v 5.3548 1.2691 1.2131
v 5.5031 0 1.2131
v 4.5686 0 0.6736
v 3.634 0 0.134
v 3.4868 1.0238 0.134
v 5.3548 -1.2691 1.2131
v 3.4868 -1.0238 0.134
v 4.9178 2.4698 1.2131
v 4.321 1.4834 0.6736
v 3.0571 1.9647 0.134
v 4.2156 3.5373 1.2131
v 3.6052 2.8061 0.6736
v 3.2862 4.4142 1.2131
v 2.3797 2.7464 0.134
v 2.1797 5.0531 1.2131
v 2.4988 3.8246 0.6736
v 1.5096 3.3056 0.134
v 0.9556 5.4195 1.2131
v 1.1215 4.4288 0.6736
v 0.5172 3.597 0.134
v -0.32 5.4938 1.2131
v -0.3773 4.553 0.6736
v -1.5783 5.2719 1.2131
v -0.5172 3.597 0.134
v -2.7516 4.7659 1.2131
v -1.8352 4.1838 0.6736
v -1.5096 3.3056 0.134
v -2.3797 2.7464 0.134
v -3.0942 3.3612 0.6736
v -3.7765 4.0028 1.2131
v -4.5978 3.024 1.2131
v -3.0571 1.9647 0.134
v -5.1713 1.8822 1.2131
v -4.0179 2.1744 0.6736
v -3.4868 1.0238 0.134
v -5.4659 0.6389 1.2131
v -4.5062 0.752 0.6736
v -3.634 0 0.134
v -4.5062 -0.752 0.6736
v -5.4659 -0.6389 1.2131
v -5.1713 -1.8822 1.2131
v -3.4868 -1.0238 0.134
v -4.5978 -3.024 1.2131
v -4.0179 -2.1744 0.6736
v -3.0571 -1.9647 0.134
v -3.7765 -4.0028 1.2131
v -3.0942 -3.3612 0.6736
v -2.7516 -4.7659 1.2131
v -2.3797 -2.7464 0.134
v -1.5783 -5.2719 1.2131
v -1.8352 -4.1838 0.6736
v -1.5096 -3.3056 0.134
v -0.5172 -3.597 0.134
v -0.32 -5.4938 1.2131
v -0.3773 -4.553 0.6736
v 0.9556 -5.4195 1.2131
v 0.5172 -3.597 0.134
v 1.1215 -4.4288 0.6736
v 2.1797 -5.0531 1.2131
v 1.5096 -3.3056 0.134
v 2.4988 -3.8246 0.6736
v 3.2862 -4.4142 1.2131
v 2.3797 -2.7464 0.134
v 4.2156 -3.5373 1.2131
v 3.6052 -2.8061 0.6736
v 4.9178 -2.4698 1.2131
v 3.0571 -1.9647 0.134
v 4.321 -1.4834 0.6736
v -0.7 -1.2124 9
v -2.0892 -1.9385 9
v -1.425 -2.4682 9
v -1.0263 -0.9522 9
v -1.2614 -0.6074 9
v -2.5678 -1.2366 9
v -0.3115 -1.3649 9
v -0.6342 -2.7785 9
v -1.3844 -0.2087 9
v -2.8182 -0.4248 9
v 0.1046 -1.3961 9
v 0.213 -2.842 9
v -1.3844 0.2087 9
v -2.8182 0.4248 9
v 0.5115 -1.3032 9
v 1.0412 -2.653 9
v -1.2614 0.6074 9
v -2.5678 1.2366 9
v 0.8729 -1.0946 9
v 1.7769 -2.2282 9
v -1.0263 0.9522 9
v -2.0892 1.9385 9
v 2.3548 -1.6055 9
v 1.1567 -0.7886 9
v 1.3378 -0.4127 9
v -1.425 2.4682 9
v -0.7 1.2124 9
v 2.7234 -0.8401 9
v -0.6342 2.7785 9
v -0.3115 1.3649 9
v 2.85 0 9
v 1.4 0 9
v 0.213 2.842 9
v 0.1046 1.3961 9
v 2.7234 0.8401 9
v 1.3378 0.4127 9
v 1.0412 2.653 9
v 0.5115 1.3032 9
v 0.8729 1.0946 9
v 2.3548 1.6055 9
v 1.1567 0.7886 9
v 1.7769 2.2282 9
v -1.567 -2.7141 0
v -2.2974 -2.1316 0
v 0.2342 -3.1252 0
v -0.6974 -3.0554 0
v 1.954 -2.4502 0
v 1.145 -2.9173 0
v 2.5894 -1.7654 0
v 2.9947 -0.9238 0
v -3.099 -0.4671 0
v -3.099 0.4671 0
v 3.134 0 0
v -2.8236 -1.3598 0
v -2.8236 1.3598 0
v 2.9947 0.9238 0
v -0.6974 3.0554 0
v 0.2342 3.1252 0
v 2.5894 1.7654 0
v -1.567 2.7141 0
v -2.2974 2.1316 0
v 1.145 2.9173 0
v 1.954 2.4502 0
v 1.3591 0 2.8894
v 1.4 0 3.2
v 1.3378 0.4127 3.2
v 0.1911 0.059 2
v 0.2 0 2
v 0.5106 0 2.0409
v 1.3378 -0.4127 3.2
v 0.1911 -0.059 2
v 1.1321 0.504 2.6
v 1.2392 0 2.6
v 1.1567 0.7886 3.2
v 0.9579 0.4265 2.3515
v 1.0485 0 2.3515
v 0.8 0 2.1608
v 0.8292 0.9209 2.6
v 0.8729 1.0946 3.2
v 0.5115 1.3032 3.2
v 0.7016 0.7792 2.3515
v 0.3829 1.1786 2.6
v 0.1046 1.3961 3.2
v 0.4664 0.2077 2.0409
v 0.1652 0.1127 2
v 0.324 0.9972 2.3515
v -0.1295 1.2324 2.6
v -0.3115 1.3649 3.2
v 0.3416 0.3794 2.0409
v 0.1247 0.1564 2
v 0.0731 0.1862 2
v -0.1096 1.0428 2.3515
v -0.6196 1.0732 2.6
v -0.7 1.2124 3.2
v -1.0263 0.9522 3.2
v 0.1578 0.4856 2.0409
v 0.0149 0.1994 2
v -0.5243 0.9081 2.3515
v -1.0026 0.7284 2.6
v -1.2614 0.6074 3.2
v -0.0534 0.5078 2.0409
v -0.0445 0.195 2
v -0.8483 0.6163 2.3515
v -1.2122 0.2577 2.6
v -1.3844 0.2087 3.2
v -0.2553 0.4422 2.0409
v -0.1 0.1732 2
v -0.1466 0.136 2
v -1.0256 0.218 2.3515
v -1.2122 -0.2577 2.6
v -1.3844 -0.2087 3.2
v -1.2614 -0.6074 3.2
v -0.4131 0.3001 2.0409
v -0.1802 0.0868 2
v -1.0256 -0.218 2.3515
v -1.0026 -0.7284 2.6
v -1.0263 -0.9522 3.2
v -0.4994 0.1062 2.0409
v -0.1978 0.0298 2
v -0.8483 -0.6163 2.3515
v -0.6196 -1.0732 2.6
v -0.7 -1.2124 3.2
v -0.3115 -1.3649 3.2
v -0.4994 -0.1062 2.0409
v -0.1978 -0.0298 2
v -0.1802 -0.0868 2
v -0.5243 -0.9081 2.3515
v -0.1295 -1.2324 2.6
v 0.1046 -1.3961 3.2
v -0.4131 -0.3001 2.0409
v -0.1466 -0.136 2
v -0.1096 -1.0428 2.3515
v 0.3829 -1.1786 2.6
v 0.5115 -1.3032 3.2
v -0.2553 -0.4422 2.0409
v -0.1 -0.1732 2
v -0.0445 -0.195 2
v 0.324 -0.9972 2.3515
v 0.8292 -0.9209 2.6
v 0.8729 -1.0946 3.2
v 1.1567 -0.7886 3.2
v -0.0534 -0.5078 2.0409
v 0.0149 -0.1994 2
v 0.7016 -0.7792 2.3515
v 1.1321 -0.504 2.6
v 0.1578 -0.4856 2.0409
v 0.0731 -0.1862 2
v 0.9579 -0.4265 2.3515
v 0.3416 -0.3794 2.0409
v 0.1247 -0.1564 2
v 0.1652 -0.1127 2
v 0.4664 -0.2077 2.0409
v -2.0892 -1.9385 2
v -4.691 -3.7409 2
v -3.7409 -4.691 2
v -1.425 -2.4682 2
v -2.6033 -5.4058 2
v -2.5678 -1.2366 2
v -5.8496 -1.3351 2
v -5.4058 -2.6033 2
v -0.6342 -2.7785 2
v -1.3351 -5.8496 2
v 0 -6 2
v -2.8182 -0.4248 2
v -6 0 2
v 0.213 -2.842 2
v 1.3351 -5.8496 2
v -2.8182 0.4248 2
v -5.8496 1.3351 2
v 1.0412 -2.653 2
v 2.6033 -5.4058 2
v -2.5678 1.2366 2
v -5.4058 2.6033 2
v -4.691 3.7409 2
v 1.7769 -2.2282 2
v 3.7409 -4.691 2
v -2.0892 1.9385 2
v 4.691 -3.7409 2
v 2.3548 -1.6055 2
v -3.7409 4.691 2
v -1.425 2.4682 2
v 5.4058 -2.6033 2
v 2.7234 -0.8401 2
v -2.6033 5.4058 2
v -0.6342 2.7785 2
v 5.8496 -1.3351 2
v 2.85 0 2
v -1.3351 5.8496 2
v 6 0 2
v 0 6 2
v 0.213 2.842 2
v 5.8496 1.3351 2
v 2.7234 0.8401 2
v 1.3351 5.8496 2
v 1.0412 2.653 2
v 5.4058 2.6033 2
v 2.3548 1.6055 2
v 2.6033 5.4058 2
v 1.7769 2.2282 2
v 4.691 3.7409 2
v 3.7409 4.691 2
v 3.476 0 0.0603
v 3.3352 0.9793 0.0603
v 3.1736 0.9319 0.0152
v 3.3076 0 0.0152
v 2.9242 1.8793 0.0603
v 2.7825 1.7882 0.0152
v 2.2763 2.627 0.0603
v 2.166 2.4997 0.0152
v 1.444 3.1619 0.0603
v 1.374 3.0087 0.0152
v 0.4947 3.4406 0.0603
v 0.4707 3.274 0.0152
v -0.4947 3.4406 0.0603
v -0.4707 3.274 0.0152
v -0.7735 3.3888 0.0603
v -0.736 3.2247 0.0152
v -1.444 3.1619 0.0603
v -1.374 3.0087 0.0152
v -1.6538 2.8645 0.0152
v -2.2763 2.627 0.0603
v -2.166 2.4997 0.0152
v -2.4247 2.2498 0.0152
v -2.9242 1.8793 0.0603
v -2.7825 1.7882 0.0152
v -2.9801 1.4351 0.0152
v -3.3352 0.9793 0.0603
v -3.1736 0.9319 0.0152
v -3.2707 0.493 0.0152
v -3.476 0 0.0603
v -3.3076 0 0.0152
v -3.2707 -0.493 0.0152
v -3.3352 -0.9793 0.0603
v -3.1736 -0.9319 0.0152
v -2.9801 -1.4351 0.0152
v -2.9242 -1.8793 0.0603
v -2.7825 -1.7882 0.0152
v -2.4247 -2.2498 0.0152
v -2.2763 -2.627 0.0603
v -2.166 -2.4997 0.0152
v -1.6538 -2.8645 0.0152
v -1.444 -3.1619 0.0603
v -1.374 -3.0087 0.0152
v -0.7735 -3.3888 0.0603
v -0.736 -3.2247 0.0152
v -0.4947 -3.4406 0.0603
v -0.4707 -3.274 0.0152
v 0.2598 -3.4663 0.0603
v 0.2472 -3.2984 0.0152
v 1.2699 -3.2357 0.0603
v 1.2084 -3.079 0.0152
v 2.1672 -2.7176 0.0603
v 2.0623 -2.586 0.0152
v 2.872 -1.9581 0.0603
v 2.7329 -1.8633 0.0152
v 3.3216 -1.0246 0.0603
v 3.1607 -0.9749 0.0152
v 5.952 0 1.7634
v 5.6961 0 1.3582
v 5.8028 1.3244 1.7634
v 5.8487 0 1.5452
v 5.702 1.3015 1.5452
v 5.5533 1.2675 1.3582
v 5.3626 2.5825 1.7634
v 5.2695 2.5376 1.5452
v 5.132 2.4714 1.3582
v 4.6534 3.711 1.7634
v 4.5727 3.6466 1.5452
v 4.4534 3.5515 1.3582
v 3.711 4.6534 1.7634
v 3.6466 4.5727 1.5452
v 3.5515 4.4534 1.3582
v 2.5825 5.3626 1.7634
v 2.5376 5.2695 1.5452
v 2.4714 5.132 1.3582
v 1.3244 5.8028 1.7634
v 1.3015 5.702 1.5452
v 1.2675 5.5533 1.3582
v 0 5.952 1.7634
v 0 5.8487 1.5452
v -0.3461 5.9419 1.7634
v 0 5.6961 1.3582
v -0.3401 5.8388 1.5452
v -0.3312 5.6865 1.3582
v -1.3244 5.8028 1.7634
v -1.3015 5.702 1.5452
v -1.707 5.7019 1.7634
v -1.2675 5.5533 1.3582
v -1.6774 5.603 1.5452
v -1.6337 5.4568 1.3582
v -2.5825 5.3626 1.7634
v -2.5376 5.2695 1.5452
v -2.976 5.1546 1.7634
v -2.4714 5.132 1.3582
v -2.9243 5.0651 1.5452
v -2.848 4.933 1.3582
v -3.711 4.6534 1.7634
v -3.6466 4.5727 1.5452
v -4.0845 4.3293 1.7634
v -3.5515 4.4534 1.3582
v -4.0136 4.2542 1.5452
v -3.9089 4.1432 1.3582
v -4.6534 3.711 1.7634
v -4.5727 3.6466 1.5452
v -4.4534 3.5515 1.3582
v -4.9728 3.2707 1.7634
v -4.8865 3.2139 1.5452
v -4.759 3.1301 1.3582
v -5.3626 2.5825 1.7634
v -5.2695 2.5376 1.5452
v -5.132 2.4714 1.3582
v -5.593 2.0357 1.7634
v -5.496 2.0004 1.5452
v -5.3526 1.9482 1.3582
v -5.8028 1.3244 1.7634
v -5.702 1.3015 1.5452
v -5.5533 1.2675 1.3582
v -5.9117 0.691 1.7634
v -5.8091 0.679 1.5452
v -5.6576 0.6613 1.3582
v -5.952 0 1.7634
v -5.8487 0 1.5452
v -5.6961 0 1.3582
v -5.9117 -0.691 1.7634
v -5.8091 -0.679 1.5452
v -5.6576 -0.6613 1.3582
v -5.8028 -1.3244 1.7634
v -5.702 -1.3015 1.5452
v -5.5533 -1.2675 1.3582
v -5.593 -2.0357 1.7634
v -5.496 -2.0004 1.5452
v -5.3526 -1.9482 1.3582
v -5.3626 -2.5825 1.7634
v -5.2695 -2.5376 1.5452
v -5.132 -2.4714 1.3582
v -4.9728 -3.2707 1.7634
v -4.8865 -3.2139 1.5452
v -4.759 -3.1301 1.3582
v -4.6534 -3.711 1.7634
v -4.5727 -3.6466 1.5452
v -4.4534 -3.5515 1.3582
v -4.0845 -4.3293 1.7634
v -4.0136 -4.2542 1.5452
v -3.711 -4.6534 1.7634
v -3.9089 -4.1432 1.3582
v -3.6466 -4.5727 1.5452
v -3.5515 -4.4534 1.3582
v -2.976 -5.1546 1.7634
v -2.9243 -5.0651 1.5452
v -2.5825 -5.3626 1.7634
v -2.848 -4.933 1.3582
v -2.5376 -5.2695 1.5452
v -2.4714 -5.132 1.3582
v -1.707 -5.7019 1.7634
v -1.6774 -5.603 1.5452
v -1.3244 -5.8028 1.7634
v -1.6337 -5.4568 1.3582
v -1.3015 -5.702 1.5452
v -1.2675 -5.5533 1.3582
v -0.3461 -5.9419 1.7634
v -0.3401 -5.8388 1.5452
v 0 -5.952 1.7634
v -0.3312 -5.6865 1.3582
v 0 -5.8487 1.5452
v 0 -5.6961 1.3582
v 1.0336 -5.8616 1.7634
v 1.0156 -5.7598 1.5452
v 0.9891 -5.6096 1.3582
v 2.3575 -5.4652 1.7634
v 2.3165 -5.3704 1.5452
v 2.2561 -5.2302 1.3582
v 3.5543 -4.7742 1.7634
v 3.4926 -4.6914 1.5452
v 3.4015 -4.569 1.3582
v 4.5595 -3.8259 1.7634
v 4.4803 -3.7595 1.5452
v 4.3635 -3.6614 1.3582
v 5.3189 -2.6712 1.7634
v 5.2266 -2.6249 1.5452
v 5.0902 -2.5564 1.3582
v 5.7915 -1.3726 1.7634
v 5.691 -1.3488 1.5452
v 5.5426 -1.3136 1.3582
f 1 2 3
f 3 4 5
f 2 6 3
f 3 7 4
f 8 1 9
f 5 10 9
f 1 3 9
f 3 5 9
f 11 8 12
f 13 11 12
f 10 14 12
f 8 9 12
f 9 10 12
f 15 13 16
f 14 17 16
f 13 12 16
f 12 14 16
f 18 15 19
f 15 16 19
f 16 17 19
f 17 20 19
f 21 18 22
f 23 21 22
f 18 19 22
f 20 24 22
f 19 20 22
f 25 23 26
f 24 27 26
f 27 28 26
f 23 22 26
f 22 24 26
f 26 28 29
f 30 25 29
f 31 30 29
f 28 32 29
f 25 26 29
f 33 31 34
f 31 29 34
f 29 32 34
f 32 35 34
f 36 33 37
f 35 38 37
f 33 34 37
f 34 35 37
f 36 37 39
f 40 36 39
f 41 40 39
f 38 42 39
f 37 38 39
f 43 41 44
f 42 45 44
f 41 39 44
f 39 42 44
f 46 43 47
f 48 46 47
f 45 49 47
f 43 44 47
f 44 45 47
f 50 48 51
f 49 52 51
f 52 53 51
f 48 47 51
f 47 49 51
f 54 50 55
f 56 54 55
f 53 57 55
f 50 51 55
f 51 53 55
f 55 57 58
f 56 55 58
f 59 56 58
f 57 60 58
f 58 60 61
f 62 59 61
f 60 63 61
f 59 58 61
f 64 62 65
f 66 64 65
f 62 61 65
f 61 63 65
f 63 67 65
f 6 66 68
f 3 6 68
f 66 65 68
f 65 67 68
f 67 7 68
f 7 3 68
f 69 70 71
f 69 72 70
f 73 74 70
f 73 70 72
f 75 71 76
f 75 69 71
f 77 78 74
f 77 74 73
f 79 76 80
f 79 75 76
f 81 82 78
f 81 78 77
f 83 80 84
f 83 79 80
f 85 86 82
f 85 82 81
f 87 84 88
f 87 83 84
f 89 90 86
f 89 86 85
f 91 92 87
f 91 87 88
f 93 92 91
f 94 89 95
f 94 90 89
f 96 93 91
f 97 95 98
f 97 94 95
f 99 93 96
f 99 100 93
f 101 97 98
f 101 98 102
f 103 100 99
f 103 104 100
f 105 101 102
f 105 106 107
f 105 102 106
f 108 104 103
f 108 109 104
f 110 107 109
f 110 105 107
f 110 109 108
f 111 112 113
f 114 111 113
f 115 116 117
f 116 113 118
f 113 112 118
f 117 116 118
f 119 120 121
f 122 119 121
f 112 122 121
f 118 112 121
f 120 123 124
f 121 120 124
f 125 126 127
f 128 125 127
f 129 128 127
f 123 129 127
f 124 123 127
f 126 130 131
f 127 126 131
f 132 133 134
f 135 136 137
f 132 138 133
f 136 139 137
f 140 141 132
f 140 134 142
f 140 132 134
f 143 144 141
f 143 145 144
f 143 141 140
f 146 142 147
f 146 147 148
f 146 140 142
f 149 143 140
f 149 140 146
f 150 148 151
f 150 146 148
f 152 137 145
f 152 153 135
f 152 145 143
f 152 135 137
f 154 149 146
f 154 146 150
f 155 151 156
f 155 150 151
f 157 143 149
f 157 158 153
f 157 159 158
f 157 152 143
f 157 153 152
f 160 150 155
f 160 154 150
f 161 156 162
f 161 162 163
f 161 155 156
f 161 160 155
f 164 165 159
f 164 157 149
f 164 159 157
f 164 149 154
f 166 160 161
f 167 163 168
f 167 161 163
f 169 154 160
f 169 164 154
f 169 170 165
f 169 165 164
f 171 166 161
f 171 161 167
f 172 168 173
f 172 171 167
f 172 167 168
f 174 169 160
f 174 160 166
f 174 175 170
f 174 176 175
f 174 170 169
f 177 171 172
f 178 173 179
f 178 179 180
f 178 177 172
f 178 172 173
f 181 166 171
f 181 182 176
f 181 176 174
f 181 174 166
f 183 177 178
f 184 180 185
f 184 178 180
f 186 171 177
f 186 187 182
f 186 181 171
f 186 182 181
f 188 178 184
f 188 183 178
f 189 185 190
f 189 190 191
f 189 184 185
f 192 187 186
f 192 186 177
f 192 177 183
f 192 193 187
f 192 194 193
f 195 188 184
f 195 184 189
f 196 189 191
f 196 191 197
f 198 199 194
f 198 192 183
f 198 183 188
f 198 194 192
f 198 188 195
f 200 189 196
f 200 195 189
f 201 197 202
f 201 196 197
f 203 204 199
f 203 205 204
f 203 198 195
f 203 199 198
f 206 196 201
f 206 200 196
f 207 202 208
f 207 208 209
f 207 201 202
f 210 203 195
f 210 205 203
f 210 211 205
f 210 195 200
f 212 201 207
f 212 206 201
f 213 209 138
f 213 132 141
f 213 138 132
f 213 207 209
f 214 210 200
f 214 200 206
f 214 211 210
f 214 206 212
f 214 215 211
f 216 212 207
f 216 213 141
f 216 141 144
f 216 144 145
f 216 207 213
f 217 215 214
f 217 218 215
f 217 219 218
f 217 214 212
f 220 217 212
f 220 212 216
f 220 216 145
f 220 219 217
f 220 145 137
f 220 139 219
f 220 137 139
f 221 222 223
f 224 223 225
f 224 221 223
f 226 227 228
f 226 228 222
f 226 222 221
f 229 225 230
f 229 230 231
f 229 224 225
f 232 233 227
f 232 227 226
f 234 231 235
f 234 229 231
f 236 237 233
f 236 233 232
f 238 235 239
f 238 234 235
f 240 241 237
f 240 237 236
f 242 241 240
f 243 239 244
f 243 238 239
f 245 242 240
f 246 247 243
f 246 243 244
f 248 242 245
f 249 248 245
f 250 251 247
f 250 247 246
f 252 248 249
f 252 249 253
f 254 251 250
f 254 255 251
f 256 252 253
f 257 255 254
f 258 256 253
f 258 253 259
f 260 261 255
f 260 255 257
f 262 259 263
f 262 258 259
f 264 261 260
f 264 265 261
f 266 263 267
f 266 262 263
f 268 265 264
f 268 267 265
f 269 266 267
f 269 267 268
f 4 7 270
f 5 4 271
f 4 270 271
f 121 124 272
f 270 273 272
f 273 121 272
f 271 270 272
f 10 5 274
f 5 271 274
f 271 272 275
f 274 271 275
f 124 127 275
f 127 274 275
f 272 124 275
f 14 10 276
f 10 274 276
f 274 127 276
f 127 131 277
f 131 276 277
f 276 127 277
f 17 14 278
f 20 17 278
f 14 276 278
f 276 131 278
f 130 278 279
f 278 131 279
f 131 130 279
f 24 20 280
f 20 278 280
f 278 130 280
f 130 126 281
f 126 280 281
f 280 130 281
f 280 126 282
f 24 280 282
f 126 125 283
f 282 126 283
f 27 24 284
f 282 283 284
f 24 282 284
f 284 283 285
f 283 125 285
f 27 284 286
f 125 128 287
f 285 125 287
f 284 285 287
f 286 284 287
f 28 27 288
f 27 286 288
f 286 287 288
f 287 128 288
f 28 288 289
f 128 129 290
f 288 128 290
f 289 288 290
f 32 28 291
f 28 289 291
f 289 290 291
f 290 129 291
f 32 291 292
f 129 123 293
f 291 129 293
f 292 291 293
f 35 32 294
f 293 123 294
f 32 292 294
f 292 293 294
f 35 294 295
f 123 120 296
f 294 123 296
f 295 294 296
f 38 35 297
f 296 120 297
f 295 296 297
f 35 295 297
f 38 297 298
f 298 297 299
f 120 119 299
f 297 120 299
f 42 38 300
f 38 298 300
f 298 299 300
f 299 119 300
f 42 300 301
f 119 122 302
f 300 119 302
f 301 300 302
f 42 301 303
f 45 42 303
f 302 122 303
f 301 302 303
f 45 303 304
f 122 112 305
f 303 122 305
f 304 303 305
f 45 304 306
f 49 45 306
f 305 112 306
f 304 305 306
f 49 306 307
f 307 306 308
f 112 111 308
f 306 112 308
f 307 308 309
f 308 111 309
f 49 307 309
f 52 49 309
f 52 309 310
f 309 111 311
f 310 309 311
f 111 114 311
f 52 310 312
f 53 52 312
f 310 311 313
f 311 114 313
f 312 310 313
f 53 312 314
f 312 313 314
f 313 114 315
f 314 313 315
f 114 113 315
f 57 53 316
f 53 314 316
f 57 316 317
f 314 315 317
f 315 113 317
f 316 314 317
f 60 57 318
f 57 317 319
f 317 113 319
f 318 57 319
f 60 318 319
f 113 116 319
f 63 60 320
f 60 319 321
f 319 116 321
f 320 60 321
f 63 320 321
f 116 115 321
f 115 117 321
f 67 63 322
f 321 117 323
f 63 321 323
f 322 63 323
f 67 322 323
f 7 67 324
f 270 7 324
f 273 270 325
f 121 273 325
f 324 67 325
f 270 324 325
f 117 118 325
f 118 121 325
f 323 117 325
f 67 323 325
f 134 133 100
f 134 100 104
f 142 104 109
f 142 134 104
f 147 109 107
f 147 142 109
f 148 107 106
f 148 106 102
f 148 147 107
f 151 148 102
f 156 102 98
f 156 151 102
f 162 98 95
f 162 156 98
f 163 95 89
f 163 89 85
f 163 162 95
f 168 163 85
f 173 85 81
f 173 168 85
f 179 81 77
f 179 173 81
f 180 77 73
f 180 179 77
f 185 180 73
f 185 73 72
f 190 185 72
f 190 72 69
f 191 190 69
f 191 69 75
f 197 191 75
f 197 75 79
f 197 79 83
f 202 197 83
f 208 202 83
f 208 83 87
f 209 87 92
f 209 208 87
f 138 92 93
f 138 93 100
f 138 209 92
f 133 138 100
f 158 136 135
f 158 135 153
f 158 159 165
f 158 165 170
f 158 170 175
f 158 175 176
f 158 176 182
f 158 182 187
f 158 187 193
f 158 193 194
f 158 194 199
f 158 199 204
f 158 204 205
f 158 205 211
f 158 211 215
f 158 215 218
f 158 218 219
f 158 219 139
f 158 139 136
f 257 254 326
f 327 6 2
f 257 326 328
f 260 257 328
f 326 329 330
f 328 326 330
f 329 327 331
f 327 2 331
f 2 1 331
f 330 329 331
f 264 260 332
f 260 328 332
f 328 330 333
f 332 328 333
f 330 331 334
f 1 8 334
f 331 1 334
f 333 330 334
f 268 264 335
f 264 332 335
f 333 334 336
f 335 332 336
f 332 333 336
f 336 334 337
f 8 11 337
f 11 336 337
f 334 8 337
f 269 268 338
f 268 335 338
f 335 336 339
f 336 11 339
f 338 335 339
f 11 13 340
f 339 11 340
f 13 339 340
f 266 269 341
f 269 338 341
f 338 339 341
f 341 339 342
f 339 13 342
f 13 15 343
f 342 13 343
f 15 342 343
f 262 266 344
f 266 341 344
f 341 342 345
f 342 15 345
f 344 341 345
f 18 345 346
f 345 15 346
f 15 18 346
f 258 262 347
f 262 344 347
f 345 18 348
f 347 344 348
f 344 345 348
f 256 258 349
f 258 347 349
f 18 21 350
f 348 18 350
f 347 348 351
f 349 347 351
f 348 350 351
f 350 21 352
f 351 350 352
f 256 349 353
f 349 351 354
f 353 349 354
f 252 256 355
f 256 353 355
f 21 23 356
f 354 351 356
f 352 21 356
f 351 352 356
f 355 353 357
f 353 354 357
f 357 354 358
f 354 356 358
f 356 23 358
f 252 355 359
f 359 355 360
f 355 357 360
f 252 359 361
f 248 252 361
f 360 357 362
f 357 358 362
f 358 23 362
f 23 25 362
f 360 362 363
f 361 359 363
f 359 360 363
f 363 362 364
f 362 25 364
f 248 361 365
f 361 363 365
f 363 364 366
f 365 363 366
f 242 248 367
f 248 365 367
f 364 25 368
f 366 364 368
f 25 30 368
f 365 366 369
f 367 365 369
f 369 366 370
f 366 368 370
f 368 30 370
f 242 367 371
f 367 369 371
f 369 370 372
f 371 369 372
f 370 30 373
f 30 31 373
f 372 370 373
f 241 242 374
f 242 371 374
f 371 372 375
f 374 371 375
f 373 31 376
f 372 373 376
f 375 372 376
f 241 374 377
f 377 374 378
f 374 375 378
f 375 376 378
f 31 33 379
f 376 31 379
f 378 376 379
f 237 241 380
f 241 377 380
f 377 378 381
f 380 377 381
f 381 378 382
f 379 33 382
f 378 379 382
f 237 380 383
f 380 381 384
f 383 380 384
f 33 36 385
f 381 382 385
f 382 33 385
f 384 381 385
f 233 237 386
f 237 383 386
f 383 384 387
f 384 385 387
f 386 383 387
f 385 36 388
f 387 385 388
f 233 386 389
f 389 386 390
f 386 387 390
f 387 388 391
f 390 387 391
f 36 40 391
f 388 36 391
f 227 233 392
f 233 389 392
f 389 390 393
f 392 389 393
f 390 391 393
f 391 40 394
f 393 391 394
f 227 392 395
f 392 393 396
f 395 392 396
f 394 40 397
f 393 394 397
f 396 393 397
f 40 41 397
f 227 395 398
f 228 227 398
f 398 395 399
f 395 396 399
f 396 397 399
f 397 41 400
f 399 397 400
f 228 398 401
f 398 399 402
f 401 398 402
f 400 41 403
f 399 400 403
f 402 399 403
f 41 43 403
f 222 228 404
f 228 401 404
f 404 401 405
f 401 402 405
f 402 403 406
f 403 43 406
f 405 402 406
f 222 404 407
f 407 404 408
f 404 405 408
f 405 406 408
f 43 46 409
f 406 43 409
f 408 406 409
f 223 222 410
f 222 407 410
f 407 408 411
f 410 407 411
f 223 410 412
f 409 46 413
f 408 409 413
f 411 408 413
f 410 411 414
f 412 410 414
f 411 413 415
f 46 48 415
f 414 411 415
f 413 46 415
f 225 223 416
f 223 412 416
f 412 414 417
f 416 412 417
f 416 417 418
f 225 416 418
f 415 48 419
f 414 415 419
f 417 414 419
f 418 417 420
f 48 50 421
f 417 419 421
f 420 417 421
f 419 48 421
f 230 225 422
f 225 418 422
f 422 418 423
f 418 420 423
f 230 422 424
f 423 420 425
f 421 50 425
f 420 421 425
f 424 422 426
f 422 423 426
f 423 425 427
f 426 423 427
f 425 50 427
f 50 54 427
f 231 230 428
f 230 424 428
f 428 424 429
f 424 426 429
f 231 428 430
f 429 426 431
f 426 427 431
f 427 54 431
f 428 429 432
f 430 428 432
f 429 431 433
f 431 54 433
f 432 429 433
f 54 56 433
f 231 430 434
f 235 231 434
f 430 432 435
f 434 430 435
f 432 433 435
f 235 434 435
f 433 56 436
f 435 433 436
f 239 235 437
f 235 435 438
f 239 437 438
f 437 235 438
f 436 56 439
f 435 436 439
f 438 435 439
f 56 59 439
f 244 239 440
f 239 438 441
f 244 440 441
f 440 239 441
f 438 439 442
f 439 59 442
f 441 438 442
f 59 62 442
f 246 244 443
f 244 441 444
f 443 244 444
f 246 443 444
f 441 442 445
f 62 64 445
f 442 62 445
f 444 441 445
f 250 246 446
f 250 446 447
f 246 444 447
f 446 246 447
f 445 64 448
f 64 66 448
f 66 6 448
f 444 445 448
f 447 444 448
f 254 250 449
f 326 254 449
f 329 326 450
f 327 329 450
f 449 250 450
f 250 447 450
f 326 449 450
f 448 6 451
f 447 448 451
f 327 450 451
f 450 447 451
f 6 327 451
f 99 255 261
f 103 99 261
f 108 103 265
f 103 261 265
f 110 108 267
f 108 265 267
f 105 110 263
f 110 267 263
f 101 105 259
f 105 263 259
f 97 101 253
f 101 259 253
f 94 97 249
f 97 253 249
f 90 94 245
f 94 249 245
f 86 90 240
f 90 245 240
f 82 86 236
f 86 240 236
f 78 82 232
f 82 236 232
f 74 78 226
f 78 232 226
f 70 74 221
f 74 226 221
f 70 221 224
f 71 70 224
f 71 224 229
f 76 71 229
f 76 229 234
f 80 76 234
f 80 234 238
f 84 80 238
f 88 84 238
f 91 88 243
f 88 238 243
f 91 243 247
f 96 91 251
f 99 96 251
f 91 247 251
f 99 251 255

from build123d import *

# Parameters (mm, degrees)
F0_R     = 6
F1_DEPTH = 2
F2_SIZE2 = 2.5980762114
F2_SIZE  = 1.5
F4_R     = 2.85
F4_R_2   = 1.4
F5_DEPTH = 7
F6_R     = 1.2


# Not quite as in the source:
# - a fillet or chamfer that OpenCascade refuses, or shapes differently, is made with other operations: its cross-section is extruded or revolved along the edge and cut away or added


with BuildPart() as f1:
    # F0 (on Top) → F1 (new body)
    with BuildSketch(Plane.XY):
        Circle(F0_R)
    extrude(amount=F1_DEPTH)

    # F2
    f2_edges = [f1.edges().sort_by_distance(p)[0] for p in [
        (-6, 0, 0),
    ]]
    f2_side = f1.faces().sort_by_distance((-6, 0, 1))[0]
    chamfer(f2_edges, length=F2_SIZE, length2=F2_SIZE2, reference=f2_side)

    # F3: fillet of radius 1 on 2 edges, made by hand

    # F3_s1 → F3_t2 (revolve, cut)
    with BuildSketch(Plane.XZ):
        with BuildLine():
            ThreePointArc((3.6339745962, 0.1339745962), (3.3927936413, 0.0340741737), (3.1339745962, 0))
            Line((3.1339745962, 0), (3.4019237886, 0))
            Line((3.4019237886, 0), (3.6339745962, 0.1339745962))
        make_face()
    revolve(axis=Axis((0, 0, 0), (0, 0, 1)), mode=Mode.SUBTRACT)

    # F3_s3 → F3_t4 (revolve, cut)
    with BuildSketch(Plane.XZ):
        with BuildLine():
            ThreePointArc((6, 2), (5.8486778537, 1.5452494356), (5.5031382462, 1.2131367327))
            Line((5.5031382462, 1.2131367327), (6, 1.5))
            Line((6, 1.5), (6, 2))
        make_face()
    revolve(axis=Axis((0, 0, 1.5), (0, 0, 1)), mode=Mode.SUBTRACT)

    # F4 (on face) → F5 (join)
    with BuildSketch(Plane.XY.offset(2)):
        Circle(F4_R)
        Circle(F4_R_2, mode=Mode.SUBTRACT)
    extrude(amount=F5_DEPTH)

    # F6
    f6_edges = [f1.edges().sort_by_distance(p)[0] for p in [
        (-1.4, 0, 2),
    ]]
    fillet(f6_edges, radius=F6_R)


solid = f1.part
